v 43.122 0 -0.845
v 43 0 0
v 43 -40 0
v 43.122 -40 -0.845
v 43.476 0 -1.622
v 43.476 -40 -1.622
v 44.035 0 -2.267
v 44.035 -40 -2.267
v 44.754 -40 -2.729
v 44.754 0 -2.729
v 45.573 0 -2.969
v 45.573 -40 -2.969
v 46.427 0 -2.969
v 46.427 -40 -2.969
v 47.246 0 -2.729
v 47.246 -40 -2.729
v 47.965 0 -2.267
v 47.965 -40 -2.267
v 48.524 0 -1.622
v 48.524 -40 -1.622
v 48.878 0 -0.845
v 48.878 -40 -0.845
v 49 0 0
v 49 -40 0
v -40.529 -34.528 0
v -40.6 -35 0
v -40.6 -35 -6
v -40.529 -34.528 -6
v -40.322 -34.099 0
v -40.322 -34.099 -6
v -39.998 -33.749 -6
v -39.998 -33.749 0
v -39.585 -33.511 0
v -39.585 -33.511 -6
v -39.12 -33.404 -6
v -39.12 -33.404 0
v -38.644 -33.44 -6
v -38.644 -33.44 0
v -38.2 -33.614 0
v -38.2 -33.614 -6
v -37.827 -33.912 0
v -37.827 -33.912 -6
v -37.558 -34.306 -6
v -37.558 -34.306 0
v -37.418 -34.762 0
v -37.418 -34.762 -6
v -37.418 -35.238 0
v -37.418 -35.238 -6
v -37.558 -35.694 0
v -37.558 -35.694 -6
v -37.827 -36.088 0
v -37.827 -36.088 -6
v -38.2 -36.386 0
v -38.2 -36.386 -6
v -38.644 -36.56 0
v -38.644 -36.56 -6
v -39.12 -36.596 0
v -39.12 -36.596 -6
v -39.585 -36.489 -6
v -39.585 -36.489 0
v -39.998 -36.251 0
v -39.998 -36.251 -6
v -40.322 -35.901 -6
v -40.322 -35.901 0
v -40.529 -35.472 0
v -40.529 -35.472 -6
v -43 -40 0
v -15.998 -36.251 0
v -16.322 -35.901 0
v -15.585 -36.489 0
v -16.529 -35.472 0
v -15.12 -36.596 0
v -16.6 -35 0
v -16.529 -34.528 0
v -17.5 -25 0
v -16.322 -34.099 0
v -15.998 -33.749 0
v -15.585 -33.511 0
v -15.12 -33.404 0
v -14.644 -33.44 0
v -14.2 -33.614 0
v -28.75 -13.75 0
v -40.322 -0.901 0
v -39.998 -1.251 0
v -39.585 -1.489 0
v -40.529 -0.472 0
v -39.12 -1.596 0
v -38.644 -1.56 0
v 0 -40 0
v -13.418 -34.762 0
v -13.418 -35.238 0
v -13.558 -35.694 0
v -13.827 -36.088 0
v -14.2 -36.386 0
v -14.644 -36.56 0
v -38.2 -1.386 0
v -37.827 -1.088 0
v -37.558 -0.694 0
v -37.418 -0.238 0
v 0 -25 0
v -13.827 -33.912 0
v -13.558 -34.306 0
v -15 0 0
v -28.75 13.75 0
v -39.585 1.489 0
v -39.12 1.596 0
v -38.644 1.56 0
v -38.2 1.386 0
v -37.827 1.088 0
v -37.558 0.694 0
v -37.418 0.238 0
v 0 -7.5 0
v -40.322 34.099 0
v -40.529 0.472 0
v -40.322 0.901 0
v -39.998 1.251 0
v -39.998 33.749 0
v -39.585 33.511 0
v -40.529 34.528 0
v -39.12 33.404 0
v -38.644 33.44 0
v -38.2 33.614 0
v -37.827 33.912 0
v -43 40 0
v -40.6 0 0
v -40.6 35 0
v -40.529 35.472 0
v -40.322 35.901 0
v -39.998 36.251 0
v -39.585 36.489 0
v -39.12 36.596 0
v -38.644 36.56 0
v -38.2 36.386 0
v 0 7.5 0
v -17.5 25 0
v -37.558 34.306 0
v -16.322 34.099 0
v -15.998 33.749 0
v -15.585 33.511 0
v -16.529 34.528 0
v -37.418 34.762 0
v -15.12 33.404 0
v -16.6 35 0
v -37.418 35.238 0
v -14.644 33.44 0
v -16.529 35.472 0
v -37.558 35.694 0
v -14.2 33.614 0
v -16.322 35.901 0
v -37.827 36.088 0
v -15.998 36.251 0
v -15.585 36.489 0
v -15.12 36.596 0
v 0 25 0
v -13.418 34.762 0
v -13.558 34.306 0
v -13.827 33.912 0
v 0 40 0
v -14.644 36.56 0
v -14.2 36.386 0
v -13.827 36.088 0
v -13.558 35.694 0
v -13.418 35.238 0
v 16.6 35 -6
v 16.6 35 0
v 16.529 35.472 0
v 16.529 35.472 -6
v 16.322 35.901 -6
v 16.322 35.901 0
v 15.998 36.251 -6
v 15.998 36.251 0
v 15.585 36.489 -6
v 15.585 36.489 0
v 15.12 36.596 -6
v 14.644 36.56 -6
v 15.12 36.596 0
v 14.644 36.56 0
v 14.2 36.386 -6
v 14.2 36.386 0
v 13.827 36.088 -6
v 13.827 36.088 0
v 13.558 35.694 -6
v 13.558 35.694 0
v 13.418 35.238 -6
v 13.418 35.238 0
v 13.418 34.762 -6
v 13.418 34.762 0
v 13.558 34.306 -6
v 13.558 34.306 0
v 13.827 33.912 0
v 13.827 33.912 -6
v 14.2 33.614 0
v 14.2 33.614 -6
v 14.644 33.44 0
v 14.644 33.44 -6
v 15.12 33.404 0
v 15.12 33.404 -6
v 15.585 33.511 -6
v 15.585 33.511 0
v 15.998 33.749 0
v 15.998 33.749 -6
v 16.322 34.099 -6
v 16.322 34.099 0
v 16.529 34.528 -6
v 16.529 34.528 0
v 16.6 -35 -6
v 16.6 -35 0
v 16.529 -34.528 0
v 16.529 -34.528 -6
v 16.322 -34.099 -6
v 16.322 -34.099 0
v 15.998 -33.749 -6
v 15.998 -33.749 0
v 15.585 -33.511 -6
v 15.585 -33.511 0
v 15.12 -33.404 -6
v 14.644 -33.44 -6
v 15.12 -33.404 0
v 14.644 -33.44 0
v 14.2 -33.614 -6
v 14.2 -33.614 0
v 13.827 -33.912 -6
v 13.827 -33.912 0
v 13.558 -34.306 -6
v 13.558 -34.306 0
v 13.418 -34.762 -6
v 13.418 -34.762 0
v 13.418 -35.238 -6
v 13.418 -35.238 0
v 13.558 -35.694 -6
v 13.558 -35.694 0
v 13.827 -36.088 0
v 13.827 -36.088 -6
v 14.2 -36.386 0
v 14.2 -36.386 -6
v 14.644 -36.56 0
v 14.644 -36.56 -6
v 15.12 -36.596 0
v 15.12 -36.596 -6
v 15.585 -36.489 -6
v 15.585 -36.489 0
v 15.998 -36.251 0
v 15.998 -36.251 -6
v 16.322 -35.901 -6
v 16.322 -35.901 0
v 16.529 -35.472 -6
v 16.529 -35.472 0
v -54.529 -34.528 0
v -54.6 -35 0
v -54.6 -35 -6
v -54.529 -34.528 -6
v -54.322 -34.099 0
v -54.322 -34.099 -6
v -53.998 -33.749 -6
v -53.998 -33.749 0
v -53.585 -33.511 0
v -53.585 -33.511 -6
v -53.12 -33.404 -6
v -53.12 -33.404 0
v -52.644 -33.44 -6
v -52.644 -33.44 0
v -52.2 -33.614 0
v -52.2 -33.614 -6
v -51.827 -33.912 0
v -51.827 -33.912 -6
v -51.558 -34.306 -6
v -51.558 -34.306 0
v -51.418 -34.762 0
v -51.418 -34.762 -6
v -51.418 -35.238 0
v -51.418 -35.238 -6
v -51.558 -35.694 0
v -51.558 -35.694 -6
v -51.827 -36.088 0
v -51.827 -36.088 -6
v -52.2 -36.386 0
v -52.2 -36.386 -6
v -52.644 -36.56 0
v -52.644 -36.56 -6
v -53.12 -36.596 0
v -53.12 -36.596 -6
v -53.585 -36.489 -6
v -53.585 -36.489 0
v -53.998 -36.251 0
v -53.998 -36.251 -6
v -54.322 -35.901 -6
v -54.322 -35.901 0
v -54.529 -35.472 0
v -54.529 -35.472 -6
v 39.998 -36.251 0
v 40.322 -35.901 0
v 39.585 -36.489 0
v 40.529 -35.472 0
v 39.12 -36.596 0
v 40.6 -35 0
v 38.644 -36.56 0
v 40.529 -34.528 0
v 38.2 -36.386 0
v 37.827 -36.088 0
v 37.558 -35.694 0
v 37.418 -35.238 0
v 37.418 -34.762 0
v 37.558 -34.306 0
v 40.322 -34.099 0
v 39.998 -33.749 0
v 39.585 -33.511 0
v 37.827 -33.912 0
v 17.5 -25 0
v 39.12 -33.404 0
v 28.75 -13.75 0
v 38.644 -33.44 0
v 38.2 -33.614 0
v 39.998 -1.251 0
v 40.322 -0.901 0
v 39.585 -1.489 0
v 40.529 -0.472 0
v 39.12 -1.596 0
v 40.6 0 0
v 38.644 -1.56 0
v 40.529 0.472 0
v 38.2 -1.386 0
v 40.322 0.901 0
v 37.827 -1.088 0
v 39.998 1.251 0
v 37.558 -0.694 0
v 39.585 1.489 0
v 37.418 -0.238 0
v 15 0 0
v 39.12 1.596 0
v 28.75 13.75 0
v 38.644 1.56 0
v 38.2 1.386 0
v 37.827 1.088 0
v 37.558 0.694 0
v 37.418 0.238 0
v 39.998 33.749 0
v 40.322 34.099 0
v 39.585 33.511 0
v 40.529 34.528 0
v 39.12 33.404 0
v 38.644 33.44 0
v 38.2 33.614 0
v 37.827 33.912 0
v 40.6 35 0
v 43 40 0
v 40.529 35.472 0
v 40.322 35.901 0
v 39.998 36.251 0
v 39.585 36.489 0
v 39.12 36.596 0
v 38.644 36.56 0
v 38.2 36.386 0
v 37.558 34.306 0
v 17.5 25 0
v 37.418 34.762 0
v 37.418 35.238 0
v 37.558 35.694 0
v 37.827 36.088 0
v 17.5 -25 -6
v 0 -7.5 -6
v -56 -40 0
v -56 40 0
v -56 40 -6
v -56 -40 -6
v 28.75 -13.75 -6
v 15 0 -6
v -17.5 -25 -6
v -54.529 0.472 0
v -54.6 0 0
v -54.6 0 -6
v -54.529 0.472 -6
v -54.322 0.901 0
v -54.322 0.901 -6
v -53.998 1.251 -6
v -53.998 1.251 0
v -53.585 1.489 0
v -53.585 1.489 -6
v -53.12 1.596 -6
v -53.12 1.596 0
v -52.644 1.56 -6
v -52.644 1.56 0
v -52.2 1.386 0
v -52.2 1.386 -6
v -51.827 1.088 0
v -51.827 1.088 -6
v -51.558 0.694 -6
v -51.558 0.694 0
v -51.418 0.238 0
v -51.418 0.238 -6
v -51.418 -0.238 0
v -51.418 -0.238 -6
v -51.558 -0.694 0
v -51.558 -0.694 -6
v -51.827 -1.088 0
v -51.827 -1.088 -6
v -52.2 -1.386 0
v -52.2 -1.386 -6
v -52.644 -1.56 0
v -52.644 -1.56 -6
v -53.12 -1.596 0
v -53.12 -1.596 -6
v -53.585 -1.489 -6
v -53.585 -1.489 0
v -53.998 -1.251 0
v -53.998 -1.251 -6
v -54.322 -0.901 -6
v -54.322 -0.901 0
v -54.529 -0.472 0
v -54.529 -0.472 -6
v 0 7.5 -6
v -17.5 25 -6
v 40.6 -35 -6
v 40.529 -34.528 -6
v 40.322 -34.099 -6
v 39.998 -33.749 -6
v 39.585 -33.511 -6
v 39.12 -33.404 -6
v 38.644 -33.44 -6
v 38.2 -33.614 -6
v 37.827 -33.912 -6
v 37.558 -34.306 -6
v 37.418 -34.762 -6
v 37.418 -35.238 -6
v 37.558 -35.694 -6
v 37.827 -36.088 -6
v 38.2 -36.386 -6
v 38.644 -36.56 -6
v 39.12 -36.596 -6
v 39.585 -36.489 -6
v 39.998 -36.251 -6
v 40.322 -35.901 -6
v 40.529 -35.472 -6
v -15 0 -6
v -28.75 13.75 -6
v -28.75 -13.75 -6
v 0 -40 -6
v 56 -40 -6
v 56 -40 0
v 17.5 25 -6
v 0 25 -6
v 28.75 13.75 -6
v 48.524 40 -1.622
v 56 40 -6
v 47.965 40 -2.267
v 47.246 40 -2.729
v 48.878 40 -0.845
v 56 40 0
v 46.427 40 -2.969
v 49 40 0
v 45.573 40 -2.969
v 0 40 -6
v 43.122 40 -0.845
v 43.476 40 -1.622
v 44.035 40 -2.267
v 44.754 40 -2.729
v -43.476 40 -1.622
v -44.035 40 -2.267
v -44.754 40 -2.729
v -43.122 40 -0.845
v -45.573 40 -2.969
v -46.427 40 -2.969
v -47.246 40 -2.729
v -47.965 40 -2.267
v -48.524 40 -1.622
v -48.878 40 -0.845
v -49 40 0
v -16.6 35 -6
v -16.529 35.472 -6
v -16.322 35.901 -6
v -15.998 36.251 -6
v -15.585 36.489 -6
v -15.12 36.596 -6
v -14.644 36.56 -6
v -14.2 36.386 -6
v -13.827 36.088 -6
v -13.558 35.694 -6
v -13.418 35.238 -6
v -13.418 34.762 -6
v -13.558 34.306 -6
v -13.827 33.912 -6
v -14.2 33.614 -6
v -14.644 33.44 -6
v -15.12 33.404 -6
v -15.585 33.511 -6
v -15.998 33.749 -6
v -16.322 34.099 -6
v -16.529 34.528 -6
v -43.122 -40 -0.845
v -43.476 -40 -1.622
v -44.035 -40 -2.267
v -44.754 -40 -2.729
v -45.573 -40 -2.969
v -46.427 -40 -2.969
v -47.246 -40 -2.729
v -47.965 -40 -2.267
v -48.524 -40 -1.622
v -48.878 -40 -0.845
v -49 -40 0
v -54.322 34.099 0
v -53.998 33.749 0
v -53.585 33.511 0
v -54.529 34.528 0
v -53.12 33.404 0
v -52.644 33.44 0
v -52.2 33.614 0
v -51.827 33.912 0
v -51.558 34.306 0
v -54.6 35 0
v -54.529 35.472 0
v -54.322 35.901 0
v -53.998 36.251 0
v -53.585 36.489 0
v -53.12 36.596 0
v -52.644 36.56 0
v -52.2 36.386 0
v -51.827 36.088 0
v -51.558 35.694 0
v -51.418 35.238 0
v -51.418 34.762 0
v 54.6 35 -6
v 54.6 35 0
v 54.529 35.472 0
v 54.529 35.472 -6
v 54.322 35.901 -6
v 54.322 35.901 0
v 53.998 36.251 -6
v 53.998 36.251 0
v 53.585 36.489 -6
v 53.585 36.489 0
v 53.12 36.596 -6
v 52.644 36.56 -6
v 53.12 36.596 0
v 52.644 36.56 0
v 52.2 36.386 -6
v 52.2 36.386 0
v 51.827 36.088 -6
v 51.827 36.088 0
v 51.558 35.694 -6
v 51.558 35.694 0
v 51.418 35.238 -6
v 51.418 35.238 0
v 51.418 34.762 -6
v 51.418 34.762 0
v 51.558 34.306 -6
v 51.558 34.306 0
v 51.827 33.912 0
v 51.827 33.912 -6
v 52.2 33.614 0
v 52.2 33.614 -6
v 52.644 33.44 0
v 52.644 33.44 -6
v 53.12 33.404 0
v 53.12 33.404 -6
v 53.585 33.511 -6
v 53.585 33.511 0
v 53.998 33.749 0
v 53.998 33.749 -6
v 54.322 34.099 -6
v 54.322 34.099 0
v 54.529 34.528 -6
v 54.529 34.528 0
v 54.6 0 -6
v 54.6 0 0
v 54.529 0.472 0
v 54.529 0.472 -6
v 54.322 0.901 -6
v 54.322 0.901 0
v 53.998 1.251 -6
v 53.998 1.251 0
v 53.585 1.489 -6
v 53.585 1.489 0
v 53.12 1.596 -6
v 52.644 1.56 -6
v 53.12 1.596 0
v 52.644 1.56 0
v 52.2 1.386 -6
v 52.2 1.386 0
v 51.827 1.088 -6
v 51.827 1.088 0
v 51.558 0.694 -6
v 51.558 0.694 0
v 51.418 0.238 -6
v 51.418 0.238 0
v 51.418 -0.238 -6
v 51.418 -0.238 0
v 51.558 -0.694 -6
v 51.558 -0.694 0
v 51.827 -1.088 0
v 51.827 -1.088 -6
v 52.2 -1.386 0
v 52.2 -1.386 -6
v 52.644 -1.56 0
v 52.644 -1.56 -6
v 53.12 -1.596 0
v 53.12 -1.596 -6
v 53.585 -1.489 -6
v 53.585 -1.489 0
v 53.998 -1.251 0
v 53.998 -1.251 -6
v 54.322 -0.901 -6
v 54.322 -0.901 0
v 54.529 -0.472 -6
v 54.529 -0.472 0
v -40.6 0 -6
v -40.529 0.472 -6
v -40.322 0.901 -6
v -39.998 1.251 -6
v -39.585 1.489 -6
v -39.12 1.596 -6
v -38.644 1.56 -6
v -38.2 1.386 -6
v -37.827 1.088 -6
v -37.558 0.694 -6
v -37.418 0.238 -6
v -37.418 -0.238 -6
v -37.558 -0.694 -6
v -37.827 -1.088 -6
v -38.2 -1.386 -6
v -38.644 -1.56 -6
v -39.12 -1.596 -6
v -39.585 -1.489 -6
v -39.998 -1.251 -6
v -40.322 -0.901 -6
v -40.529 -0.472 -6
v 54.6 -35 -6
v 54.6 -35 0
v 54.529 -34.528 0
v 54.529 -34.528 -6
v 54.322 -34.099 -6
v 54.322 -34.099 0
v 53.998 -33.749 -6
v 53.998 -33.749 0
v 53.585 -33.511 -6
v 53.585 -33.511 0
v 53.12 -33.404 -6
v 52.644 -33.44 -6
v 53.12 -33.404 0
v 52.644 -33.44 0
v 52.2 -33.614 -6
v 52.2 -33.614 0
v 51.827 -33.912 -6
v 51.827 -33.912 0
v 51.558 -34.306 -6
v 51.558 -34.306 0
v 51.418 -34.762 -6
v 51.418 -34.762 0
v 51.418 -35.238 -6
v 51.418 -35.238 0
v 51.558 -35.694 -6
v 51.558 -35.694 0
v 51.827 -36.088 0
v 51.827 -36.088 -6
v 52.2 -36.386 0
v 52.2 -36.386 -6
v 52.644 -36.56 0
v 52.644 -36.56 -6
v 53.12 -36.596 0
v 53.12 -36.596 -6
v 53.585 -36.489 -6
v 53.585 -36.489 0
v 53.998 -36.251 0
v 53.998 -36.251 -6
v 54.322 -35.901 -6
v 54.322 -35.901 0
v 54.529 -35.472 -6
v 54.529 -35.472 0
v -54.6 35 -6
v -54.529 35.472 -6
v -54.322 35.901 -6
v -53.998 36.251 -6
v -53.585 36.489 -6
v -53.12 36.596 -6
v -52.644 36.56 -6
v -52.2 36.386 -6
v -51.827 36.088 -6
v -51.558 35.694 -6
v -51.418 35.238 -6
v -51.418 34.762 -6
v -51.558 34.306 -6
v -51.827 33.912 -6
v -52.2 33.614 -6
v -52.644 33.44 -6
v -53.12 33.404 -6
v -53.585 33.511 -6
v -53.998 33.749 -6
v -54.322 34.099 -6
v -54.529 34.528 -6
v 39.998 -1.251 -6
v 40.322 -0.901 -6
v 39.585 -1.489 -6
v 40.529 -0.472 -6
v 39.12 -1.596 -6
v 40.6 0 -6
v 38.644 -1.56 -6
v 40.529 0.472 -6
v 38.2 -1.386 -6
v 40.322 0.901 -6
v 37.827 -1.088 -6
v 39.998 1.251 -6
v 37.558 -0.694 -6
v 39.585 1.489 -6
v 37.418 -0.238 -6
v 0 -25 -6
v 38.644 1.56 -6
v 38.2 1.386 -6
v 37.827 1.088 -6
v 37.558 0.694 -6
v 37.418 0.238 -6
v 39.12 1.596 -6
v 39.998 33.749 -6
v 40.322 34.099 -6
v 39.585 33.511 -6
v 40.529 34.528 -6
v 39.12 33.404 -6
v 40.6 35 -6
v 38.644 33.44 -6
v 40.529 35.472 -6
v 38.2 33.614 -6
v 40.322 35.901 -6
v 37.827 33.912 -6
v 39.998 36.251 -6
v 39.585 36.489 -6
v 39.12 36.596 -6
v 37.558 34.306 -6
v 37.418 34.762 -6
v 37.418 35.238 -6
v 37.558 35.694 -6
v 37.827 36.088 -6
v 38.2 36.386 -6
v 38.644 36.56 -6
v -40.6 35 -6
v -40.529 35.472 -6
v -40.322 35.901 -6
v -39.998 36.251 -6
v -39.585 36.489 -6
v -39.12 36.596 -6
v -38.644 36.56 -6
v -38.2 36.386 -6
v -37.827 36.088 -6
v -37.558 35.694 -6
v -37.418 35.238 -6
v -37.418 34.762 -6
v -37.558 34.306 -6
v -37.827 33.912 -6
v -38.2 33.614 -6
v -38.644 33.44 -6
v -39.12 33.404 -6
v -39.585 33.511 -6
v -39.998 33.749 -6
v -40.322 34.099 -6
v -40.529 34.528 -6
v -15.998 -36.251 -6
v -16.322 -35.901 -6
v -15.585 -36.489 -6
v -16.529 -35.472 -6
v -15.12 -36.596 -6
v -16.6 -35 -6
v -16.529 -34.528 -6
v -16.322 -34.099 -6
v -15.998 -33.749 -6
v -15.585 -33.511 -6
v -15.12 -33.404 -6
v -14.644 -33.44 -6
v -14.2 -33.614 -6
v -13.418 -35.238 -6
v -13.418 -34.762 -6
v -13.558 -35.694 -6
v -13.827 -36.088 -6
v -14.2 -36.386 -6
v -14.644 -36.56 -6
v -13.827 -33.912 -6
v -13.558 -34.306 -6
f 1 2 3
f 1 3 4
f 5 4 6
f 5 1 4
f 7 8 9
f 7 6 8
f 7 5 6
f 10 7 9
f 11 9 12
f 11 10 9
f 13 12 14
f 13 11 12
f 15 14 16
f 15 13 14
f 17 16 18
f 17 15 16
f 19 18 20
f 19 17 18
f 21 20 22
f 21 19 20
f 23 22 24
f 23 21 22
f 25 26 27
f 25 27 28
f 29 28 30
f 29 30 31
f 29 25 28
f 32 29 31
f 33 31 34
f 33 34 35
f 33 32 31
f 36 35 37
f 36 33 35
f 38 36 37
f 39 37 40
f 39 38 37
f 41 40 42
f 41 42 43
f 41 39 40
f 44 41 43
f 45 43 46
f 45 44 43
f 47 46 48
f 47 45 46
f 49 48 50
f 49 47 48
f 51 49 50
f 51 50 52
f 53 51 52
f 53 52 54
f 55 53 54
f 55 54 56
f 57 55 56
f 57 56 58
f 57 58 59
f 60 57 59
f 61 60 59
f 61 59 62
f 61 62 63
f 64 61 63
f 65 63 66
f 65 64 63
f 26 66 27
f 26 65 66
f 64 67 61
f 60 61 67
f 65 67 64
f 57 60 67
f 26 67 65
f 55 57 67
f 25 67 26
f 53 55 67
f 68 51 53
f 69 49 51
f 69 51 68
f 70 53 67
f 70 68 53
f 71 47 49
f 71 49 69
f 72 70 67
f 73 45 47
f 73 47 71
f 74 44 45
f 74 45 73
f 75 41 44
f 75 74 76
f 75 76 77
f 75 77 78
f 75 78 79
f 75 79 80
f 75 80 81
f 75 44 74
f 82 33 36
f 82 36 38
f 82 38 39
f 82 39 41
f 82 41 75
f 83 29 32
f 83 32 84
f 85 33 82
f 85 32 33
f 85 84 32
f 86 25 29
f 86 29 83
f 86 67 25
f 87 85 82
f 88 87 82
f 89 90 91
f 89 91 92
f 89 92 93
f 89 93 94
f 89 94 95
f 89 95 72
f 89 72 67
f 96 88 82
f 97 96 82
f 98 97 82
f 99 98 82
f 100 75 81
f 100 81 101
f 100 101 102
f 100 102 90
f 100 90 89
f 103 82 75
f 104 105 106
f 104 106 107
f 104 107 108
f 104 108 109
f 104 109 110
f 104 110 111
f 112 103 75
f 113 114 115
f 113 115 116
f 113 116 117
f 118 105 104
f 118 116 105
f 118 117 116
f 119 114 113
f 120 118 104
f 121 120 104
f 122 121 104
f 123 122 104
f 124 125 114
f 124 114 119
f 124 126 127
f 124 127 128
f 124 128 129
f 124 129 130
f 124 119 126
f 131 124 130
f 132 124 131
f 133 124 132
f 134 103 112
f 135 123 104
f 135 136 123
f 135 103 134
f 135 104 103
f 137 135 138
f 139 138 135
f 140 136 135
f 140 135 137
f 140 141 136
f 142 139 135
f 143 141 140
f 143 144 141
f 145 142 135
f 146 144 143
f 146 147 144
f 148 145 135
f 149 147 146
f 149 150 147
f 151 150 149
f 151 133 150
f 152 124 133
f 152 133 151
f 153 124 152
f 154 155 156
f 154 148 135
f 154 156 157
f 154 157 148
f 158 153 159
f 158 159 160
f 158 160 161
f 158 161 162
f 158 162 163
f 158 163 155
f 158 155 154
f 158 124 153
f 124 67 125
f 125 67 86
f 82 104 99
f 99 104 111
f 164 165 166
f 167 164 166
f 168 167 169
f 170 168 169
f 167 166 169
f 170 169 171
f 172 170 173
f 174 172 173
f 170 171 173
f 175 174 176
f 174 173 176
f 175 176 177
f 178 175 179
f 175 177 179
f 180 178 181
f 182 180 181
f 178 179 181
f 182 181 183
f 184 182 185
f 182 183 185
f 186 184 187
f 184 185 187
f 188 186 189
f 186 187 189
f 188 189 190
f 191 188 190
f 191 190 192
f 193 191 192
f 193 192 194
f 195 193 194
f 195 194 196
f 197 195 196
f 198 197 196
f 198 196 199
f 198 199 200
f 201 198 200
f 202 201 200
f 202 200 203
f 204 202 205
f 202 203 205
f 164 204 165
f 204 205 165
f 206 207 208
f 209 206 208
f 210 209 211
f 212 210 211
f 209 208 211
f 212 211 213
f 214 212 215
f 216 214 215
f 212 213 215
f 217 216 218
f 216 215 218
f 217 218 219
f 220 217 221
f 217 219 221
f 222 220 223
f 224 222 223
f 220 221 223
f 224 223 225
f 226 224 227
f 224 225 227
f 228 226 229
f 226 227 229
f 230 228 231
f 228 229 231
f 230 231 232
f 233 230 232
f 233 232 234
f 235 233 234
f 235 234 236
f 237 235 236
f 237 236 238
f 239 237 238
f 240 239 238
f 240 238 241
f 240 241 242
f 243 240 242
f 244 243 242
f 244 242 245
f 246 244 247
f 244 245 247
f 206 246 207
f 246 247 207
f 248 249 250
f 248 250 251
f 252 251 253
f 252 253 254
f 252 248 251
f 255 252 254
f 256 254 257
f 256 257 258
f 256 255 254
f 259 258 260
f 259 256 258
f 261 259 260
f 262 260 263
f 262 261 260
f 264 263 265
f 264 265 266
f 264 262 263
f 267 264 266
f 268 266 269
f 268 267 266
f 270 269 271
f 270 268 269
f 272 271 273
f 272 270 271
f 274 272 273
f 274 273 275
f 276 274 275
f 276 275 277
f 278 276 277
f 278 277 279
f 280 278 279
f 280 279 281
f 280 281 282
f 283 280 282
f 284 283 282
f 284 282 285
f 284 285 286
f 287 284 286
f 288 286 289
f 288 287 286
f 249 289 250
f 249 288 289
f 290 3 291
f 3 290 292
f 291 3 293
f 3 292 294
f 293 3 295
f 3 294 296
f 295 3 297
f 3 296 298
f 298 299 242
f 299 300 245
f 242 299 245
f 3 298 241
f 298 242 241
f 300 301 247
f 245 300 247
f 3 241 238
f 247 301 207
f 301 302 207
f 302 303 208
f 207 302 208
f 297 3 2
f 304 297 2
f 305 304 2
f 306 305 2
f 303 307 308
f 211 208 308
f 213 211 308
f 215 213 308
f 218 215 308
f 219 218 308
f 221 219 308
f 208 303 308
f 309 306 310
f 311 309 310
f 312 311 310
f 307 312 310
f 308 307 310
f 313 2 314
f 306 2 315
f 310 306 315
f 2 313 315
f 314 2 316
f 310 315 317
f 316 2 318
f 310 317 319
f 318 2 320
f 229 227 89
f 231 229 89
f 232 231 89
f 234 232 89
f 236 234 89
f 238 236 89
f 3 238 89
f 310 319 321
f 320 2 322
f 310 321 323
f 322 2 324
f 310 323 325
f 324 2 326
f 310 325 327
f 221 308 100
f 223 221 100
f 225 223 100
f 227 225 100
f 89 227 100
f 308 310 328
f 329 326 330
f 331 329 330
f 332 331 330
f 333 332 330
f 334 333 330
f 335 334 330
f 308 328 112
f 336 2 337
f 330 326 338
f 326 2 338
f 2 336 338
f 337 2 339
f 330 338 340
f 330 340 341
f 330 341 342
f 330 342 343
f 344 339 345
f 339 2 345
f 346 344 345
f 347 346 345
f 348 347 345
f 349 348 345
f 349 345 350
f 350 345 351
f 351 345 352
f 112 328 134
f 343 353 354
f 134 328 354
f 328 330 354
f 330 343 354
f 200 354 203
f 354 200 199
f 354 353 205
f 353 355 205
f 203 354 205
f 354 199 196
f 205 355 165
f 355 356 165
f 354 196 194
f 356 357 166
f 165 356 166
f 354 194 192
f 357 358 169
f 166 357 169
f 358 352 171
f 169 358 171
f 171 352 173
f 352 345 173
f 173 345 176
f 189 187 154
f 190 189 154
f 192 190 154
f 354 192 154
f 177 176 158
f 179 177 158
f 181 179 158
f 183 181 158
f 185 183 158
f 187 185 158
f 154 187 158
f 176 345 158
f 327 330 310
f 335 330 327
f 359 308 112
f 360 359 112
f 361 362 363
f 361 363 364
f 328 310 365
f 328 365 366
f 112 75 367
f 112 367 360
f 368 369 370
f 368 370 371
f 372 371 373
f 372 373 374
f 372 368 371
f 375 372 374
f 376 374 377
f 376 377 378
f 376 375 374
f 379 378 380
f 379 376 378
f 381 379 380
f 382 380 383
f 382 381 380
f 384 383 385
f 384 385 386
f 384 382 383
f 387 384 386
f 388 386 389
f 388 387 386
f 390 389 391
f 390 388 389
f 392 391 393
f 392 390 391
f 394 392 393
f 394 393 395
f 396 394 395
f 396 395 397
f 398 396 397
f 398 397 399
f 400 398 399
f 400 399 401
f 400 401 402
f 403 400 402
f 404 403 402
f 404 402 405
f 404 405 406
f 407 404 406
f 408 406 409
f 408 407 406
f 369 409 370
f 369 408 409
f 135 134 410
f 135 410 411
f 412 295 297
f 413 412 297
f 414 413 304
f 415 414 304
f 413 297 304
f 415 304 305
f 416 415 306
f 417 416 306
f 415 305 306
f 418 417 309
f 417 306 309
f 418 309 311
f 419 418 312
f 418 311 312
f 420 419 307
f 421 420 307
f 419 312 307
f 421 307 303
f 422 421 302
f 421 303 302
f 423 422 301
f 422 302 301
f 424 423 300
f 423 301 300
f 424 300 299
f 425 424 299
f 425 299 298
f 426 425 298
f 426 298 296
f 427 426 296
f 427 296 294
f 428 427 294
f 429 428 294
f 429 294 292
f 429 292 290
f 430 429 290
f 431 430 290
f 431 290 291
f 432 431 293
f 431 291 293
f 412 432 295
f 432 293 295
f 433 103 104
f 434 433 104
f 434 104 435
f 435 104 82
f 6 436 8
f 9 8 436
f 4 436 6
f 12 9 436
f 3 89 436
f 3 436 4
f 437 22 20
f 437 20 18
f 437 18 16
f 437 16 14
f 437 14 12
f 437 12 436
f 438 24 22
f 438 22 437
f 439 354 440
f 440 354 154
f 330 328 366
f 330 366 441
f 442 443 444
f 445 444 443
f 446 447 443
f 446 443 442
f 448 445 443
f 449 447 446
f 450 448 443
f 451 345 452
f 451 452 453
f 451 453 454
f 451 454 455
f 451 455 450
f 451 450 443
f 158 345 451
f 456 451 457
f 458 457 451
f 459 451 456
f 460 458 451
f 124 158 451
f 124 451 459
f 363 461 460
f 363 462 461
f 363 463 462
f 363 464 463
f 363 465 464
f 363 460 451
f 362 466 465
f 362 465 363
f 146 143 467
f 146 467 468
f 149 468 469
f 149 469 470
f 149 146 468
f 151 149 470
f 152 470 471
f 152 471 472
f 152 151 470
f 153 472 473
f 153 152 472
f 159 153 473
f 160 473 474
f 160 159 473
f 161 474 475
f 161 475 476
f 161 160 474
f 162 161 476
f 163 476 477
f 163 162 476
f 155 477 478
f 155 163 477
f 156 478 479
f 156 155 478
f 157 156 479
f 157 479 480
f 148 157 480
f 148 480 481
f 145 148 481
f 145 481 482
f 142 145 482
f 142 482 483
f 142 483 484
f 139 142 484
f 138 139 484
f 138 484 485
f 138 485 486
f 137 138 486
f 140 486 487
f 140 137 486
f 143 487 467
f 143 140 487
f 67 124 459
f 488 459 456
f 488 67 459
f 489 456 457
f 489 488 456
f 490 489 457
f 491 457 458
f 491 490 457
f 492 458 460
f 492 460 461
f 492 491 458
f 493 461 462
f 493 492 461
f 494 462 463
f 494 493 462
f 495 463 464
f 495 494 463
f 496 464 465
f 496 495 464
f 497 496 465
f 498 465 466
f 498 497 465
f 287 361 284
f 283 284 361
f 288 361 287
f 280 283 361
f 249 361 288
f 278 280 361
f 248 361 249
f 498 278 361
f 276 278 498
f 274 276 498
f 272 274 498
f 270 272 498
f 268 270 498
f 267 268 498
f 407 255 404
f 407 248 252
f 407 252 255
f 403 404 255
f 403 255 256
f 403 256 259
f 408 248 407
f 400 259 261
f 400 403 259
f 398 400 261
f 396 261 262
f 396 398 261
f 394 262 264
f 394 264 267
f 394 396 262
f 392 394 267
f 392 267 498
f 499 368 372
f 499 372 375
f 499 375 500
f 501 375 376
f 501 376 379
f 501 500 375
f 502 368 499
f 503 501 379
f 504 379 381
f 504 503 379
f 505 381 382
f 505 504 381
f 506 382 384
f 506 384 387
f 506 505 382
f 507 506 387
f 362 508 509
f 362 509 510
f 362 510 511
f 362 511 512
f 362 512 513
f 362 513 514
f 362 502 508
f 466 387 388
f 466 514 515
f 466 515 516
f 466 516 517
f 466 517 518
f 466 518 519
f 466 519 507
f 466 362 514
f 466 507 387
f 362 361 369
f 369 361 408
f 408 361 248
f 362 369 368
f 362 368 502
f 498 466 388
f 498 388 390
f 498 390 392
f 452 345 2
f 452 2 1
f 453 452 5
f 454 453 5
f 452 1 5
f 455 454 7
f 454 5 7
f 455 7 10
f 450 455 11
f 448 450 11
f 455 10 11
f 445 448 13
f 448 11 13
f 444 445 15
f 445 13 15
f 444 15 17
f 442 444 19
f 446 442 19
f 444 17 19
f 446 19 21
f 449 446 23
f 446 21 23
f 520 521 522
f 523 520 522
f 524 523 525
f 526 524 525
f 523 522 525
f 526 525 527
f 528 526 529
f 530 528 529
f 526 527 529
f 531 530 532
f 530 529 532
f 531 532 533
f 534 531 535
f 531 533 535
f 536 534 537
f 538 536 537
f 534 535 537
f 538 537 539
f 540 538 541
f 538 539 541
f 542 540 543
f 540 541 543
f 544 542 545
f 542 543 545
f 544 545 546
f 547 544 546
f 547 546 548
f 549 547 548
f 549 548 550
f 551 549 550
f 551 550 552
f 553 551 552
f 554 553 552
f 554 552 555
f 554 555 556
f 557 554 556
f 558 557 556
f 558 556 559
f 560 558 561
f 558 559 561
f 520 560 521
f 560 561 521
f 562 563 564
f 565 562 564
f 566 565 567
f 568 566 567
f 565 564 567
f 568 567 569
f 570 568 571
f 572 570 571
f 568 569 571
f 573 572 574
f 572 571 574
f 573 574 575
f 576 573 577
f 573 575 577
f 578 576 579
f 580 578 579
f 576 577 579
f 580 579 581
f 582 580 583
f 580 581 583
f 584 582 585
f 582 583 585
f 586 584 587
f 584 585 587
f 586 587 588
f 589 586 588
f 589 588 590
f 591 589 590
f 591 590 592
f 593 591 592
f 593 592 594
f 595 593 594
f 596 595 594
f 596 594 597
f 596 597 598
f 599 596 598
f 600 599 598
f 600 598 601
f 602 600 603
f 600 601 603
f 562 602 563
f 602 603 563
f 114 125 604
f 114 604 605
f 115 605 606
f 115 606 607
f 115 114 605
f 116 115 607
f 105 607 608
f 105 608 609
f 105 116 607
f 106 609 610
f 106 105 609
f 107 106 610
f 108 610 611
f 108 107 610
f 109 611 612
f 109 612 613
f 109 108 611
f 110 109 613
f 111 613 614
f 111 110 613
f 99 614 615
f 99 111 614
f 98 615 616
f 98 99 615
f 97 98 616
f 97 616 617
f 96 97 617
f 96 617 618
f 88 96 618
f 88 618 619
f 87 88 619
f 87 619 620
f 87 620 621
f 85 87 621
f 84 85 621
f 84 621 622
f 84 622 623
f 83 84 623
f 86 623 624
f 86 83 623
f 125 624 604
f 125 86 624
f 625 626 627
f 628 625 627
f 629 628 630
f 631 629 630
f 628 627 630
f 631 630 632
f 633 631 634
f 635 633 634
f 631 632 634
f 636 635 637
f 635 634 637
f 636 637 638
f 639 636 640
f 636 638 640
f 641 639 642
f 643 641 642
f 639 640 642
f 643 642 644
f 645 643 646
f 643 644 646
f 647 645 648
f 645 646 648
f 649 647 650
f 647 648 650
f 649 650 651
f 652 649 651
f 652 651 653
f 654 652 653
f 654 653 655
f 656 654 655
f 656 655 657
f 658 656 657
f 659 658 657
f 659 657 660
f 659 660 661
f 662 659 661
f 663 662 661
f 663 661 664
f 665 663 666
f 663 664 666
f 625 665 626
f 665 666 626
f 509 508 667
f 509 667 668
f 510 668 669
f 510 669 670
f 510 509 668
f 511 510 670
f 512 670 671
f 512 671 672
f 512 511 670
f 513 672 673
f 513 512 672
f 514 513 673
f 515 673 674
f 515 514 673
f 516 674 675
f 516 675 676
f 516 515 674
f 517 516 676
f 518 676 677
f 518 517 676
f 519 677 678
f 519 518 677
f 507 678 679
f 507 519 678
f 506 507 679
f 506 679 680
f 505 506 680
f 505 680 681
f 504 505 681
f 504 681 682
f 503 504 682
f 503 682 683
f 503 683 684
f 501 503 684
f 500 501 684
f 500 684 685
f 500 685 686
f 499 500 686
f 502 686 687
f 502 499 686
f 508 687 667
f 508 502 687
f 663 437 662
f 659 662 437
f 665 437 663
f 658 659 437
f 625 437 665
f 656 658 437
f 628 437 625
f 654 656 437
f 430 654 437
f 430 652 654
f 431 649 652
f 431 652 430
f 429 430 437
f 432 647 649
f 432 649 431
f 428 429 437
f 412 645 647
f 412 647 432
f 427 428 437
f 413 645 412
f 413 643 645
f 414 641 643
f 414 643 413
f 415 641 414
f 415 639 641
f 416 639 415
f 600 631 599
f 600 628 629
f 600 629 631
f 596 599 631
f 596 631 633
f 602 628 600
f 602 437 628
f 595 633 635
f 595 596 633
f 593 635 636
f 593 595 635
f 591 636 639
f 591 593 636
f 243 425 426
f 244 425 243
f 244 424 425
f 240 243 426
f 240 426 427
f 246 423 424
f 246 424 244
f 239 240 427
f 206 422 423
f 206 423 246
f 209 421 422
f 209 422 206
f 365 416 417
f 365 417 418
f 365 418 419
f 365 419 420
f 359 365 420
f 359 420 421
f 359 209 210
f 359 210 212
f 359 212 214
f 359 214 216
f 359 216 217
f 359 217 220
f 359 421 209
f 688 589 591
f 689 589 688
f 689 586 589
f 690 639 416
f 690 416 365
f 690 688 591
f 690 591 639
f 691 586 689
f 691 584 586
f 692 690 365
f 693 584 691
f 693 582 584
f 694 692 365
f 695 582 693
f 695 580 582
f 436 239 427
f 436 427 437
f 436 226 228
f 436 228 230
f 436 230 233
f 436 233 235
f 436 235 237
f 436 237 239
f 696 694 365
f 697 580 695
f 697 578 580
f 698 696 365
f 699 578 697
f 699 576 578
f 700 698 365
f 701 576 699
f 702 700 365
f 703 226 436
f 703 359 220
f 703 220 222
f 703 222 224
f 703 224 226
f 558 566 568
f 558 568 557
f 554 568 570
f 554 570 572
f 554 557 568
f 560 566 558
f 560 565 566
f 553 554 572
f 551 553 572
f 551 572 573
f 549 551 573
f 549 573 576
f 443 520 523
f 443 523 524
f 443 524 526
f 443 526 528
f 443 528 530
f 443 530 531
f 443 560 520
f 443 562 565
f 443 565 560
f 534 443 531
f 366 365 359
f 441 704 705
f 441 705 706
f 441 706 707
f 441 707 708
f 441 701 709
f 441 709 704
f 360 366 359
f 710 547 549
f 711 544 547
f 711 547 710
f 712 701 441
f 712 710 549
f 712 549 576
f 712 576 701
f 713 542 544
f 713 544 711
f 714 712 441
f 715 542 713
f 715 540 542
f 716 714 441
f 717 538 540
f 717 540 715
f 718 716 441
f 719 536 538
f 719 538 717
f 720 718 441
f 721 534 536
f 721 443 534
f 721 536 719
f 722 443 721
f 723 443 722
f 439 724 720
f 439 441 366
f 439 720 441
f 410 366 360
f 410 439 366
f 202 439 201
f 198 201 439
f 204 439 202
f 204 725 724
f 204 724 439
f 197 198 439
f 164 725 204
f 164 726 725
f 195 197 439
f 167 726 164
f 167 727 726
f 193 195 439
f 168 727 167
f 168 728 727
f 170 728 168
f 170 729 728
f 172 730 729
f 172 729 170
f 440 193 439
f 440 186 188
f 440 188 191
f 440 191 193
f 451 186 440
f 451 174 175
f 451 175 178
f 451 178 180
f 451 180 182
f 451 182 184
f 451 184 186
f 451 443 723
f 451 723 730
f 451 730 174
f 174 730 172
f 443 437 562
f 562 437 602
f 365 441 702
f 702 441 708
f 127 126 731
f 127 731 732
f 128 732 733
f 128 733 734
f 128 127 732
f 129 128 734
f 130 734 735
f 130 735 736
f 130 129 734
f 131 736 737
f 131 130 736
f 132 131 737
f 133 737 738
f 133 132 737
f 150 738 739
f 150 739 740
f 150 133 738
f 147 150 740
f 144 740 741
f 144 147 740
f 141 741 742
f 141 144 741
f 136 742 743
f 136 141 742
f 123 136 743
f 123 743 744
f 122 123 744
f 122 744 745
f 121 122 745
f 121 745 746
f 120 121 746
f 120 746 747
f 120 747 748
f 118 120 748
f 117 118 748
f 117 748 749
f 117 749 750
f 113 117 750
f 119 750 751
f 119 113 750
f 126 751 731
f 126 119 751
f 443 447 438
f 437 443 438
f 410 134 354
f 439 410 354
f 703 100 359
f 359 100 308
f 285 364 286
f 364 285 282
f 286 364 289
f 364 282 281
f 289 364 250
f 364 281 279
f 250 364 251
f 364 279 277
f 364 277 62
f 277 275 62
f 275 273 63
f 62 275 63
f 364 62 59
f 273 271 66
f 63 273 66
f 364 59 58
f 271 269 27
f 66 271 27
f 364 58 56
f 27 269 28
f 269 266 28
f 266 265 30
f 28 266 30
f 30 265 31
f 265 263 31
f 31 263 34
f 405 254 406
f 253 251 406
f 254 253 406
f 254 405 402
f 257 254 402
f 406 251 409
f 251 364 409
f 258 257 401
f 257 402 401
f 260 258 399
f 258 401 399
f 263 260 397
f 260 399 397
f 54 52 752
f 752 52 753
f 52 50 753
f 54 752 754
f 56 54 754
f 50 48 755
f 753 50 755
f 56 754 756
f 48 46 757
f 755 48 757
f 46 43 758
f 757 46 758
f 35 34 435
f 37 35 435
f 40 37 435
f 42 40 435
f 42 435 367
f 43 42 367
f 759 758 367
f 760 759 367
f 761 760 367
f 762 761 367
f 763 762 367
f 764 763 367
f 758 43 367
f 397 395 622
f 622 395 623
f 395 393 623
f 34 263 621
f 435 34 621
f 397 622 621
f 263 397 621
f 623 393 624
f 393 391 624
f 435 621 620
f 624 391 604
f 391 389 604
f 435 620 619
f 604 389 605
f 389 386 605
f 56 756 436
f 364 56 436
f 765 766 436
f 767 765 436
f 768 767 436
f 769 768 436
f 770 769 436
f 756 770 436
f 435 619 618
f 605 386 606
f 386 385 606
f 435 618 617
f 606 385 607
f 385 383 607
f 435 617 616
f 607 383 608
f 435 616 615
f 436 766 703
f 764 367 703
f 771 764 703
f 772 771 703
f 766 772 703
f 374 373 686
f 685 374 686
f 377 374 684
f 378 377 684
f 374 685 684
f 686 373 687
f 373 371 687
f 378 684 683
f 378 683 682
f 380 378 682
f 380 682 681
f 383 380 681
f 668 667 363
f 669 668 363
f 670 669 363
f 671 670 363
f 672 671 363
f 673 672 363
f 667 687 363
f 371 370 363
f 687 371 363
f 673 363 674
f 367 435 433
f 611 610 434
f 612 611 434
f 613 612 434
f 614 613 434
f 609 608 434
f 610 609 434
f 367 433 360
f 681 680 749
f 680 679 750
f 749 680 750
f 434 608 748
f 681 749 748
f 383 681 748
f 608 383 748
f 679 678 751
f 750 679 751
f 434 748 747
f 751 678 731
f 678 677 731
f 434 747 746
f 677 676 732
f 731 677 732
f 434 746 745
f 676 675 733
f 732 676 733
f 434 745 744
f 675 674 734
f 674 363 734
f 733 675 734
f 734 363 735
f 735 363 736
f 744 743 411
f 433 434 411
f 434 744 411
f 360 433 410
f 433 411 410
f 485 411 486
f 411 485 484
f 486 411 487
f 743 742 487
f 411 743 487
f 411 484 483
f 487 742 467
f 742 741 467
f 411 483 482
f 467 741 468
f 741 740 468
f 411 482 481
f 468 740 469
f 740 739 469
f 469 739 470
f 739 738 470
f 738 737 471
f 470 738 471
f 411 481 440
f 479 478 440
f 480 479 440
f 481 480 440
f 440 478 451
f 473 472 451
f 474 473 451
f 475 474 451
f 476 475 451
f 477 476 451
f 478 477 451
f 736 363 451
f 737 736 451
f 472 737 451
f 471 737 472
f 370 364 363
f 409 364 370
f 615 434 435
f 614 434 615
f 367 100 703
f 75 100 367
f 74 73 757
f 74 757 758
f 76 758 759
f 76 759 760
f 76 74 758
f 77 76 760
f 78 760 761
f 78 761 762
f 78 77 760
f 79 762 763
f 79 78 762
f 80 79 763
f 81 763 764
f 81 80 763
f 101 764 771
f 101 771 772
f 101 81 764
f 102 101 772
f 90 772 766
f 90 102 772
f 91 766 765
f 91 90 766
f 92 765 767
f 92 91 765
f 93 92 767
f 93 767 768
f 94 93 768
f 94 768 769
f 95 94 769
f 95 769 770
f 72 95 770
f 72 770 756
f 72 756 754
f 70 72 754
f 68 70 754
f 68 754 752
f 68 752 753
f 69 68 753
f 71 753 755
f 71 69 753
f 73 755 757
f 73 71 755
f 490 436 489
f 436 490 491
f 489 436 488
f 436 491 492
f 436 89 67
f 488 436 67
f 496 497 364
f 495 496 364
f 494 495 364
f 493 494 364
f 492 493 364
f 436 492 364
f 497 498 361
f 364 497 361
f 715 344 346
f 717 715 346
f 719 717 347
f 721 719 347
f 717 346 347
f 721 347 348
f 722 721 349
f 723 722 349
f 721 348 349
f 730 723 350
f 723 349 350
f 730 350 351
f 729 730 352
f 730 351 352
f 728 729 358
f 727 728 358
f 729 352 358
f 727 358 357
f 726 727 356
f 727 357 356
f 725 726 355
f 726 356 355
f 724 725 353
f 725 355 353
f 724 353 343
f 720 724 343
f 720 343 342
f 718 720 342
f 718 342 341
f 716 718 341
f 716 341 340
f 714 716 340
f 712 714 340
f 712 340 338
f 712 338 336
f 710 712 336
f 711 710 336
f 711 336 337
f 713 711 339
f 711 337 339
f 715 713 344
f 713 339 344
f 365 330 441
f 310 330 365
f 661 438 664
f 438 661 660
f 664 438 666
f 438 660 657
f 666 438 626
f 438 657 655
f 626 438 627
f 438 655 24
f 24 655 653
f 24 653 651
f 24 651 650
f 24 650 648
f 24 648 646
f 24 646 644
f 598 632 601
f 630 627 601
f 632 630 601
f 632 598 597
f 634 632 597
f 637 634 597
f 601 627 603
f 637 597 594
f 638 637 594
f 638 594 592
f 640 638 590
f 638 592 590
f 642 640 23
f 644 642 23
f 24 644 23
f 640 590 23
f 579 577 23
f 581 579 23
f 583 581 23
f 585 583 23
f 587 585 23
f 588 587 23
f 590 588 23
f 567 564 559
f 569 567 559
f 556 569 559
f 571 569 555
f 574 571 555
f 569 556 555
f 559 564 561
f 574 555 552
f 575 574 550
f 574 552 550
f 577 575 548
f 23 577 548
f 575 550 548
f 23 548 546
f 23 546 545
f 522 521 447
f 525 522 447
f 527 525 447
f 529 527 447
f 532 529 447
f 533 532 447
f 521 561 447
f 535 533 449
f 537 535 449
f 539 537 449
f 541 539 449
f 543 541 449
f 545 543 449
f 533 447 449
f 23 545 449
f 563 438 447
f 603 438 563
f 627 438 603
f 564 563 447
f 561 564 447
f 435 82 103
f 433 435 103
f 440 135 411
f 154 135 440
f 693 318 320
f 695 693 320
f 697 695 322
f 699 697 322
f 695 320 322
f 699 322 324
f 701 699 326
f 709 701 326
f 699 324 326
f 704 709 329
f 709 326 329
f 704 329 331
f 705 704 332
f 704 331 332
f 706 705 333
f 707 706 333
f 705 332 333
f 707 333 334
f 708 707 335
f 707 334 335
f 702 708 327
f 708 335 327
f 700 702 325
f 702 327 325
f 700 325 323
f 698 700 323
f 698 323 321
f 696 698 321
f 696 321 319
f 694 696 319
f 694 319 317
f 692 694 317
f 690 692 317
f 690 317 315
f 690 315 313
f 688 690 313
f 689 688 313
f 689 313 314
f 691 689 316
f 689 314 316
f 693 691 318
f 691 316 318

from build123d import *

# Parameters (mm, degrees)
SKETCH_R          = 1.6
PAD_DEPTH         = 6
SKETCH001_R       = 3
POCKET_DEPTH      = 40.001
POCKET_DEPTH_BACK = -40.001


with BuildPart() as toolbody:
    # Sketch → Pad (new body)
    with BuildSketch(Plane.XY):
        Polygon((0, 40), (46, 40), (56, 40), (56, -40), (46, -40), (0, -40), (0, -25), (17.5, -25), (0, -7.5), (0, 7.5), (17.5, 25), (0, 25), align=None)
        with Locations((53, 0)):
            Circle(SKETCH_R, mode=Mode.SUBTRACT)
        with Locations((53, 35)):
            Circle(SKETCH_R, mode=Mode.SUBTRACT)
        with Locations((53, -35)):
            Circle(SKETCH_R, mode=Mode.SUBTRACT)
        with Locations((39, 35)):
            Circle(SKETCH_R, mode=Mode.SUBTRACT)
        with Locations((39, 0)):
            Circle(SKETCH_R, mode=Mode.SUBTRACT)
        with Locations((39, -35)):
            Circle(SKETCH_R, mode=Mode.SUBTRACT)
        with Locations((15, 35)):
            Circle(SKETCH_R, mode=Mode.SUBTRACT)
        with Locations((15, -35)):
            Circle(SKETCH_R, mode=Mode.SUBTRACT)
        Polygon((15, 0), (28.75, 13.75), (28.75, -13.75), align=None, mode=Mode.SUBTRACT)
    extrude(amount=-PAD_DEPTH)

    # Sketch001 → Pocket (cut, two sides)
    with BuildSketch(Plane.XZ) as pocket_sk:
        with Locations((46, 0)):
            Circle(SKETCH001_R)
    extrude(amount=-POCKET_DEPTH, mode=Mode.SUBTRACT)
    extrude(pocket_sk.sketch, amount=-POCKET_DEPTH_BACK, mode=Mode.SUBTRACT)


with BuildPart() as toolfusion:
    # Part__Mirroring: instance of ToolBody
    add(toolbody.part.mirror(Plane(origin=(0, 0, 0), x_dir=(0, -1, 0), z_dir=(1, 0, 0))))

    # Fusion: union ToolBody
    add(toolbody.part)


solid = toolfusion.part
